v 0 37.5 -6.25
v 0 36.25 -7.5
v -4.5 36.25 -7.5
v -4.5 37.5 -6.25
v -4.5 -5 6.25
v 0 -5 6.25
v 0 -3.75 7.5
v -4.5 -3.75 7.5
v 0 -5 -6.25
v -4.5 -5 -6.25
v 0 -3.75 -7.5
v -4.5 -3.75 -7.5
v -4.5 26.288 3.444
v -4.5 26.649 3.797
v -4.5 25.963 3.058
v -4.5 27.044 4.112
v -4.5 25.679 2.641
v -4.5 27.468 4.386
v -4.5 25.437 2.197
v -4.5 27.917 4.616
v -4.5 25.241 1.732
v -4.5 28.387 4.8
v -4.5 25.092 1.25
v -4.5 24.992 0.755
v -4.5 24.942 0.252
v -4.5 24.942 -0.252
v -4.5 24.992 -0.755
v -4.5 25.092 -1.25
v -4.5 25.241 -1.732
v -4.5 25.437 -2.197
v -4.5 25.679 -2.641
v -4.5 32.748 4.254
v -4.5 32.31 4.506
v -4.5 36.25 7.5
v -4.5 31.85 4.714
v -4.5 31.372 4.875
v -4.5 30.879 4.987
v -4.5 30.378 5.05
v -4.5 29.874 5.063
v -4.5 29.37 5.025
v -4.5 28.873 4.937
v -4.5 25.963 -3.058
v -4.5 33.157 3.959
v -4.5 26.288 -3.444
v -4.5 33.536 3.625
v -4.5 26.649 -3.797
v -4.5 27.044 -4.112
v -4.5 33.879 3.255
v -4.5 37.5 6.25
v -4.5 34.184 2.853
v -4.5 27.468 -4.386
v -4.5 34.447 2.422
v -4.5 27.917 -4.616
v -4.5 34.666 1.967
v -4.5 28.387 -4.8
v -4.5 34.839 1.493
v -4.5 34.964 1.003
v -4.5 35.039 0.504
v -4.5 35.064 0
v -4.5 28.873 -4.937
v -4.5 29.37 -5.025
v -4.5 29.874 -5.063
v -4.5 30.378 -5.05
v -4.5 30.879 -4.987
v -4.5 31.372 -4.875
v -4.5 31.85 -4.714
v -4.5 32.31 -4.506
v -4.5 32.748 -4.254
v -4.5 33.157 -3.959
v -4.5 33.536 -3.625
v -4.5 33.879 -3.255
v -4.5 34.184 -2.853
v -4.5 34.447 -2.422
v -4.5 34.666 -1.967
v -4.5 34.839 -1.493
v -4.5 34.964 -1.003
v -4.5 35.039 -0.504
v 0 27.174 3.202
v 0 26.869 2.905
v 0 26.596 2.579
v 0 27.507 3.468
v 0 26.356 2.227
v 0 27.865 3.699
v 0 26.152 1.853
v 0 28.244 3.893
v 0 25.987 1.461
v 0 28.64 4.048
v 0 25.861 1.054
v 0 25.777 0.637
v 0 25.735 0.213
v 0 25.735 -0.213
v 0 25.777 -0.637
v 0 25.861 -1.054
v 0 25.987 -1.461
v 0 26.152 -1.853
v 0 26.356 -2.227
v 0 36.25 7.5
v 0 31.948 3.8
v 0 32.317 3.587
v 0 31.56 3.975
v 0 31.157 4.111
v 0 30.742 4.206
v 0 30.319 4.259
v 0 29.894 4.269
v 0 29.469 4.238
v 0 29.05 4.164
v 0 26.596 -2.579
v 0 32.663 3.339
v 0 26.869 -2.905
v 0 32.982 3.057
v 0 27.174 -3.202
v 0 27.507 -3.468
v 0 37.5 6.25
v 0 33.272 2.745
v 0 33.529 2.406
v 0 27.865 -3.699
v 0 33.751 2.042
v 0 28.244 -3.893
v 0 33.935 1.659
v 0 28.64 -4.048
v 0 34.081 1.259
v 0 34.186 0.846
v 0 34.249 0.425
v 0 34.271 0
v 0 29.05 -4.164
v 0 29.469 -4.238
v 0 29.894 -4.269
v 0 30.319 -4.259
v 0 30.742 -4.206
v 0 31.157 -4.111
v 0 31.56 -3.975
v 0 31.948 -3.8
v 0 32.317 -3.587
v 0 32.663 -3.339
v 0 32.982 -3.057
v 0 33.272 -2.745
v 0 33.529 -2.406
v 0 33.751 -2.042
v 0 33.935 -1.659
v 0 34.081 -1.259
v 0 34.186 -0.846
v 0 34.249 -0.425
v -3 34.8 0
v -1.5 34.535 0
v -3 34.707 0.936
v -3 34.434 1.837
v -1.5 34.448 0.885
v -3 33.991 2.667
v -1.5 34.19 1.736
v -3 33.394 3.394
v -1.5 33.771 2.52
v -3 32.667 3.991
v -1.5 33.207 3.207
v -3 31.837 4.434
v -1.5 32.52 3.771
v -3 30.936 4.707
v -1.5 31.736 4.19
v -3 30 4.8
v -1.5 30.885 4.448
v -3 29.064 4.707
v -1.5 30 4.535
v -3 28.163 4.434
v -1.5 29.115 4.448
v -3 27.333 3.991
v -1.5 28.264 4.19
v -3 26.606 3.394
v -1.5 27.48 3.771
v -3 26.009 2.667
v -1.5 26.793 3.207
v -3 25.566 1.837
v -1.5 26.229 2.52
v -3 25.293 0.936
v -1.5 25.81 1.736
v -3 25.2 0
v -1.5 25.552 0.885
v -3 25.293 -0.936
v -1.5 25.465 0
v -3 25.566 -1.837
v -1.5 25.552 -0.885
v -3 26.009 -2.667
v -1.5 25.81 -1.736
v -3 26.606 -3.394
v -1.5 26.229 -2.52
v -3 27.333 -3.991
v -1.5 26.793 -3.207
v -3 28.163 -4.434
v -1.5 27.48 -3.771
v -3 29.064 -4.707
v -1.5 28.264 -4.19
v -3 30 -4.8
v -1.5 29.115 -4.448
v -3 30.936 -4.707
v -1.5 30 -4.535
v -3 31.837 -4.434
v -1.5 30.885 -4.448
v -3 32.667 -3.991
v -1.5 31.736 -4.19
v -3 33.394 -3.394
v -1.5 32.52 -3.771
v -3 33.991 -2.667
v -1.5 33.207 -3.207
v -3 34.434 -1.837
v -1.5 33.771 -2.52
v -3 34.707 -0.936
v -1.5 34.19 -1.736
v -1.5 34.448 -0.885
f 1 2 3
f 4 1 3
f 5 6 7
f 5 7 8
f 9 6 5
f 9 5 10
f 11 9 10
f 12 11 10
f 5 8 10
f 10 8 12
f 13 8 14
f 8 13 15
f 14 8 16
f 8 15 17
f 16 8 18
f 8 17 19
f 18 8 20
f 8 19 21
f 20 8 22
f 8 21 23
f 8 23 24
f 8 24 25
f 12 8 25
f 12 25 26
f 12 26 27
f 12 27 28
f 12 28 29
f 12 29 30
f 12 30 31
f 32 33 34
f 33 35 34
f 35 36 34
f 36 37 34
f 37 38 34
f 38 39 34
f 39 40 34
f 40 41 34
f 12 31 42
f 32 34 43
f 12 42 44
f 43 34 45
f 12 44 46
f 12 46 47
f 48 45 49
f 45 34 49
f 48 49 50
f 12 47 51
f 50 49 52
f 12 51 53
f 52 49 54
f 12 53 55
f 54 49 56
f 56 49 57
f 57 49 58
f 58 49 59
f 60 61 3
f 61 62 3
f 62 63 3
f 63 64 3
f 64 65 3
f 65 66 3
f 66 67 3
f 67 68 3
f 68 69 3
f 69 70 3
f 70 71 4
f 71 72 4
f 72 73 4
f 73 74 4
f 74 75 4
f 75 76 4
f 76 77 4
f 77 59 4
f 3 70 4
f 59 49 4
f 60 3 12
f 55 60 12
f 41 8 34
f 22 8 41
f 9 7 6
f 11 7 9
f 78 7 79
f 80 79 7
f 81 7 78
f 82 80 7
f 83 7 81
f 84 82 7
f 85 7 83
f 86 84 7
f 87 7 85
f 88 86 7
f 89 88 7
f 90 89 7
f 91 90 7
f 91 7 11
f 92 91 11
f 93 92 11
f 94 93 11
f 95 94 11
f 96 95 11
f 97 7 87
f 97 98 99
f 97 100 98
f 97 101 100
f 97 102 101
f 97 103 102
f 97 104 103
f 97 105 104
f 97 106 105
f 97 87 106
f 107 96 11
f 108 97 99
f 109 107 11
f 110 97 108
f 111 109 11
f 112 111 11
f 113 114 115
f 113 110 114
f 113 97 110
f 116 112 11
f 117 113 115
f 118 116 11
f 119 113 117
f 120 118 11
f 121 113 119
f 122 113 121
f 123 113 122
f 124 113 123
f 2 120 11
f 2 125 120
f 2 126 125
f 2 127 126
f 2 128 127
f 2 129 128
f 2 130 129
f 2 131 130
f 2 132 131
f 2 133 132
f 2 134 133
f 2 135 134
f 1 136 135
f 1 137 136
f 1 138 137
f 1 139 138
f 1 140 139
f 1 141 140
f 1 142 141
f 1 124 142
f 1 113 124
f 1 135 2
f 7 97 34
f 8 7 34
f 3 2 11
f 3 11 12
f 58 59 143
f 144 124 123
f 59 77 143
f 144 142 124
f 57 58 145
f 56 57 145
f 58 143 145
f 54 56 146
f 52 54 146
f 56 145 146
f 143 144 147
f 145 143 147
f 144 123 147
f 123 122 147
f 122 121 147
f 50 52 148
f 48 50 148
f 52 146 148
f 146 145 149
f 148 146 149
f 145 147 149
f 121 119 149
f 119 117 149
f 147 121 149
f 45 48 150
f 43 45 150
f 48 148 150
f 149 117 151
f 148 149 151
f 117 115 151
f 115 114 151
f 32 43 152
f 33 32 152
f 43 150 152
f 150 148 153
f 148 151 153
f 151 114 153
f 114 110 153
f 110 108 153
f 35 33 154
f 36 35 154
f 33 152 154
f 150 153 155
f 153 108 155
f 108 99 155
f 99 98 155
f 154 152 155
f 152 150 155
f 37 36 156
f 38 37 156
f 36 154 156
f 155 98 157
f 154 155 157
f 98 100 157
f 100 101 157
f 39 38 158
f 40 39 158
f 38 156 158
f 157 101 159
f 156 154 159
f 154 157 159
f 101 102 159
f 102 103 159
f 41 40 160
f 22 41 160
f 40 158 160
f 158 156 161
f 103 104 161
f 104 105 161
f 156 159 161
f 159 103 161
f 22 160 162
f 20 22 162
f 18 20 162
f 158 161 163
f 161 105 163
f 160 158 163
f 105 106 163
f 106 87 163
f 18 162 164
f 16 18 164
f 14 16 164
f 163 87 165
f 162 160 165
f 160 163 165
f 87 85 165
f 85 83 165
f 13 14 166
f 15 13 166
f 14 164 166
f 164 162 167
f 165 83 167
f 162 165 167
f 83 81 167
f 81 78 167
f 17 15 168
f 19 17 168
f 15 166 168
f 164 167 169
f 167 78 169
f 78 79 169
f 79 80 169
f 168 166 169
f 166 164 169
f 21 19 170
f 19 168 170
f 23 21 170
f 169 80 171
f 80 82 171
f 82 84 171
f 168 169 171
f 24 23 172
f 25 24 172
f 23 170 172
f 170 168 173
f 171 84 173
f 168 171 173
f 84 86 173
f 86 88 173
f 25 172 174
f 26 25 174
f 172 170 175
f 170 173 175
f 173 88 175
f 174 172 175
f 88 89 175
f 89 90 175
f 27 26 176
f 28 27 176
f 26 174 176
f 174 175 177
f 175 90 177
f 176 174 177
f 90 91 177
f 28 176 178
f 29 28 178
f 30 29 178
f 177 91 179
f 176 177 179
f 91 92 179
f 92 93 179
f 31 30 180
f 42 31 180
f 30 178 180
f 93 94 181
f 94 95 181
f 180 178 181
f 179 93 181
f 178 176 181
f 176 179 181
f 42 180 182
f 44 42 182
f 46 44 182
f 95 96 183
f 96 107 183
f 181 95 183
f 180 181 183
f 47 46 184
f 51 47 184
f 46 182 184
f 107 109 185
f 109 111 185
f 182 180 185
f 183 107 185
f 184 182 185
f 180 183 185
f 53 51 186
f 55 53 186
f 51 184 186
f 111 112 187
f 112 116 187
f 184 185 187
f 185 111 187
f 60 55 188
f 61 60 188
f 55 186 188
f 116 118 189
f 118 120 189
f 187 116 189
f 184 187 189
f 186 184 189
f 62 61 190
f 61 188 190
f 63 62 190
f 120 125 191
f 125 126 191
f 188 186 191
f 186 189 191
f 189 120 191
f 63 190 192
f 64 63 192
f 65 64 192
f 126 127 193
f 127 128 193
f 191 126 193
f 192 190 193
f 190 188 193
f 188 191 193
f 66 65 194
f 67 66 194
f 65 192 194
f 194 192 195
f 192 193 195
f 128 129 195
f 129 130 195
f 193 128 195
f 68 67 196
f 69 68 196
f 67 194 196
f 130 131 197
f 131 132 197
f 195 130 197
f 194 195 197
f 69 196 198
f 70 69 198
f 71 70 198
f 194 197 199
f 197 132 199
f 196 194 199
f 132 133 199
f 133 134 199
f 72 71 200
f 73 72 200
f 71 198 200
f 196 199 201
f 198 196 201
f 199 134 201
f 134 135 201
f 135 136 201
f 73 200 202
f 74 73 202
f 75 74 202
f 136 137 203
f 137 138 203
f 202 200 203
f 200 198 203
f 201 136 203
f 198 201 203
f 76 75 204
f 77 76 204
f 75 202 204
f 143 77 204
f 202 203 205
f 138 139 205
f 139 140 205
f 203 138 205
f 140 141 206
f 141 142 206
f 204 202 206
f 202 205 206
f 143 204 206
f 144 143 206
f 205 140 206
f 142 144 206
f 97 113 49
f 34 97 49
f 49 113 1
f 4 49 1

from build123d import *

# Parameters (mm, degrees)
SKETCH1_W                               = 15
SKETCH1_H                               = 37.5
BOSS_EXTRUDE1_DEPTH                     = 4.5
SKETCH2_R                               = 5
CUT_EXTRUDE1_DEPTH                      = 5
CUT_EXTRUDE1_TAPER                      = 10
CUT_EXTRUDE1_OTHER_WAY_DEPTH            = 39.568121551
OFFSET_TO_ACCOUNT_FOR_BASE_THICKNESS_BY = 5
CHAMFER1_SIZE                           = 1.25


# Read off the part's stored shape, not the designer's step: Offset for 3D print
with BuildPart() as part:
    # Sketch1 → Boss-Extrude1 (new body)
    with BuildSketch(Plane(origin=(0, 0, 0), x_dir=(0, 0, -1), z_dir=(1, 0, 0))):
        with Locations((0, 18.75)):
            Rectangle(SKETCH1_W, SKETCH1_H)
    extrude(amount=-BOSS_EXTRUDE1_DEPTH)

    # Sketch2 → Cut-Extrude1 (cut)
    with BuildSketch(Plane(origin=(-5, 0, 0), x_dir=(0, 0, -1), z_dir=(1, 0, 0))):
        with Locations((0, 30)):
            Circle(SKETCH2_R)
    extrude(amount=CUT_EXTRUDE1_DEPTH, taper=CUT_EXTRUDE1_TAPER, mode=Mode.SUBTRACT)

    # Sketch2 → Cut-Extrude1 other way (cut)
    with BuildSketch(Plane(origin=(-5, 0, 0), x_dir=(0, 0, -1), z_dir=(1, 0, 0))):
        with Locations((0, 30)):
            Circle(SKETCH2_R)
    extrude(amount=-CUT_EXTRUDE1_OTHER_WAY_DEPTH, mode=Mode.SUBTRACT)

    # Offset to account for Base Thickness: a face moved outward by 5.0
    extrude(part.faces().sort_by_distance((-2.25, 0, 0))[0], amount=OFFSET_TO_ACCOUNT_FOR_BASE_THICKNESS_BY, dir=(0, -1, 0))

    # Chamfer1
    chamfer1_edges = [part.edges().sort_by_distance(p)[0] for p in [
        (-2.25, -5, -7.5),
        (-2.25, -5, 7.5),
        (-2.25, 37.5, 7.5),
        (-2.25, 37.5, -7.5),
    ]]
    chamfer(chamfer1_edges, length=CHAMFER1_SIZE)

    # Offset for 3D print outline → Offset for 3D print (revolve, cut)
    with BuildSketch(Plane(origin=(0, 30, 0), x_dir=(0, 1, 0), z_dir=(0, 0, -1))):
        Polygon((4.118365096, 0), (4.91183651, -4.5), (5.064150501, -4.5), (4.270679088, 0), align=None)
    revolve(axis=Axis((0, 30, 0), (1, 0, 0)), mode=Mode.SUBTRACT)


solid = part.part
